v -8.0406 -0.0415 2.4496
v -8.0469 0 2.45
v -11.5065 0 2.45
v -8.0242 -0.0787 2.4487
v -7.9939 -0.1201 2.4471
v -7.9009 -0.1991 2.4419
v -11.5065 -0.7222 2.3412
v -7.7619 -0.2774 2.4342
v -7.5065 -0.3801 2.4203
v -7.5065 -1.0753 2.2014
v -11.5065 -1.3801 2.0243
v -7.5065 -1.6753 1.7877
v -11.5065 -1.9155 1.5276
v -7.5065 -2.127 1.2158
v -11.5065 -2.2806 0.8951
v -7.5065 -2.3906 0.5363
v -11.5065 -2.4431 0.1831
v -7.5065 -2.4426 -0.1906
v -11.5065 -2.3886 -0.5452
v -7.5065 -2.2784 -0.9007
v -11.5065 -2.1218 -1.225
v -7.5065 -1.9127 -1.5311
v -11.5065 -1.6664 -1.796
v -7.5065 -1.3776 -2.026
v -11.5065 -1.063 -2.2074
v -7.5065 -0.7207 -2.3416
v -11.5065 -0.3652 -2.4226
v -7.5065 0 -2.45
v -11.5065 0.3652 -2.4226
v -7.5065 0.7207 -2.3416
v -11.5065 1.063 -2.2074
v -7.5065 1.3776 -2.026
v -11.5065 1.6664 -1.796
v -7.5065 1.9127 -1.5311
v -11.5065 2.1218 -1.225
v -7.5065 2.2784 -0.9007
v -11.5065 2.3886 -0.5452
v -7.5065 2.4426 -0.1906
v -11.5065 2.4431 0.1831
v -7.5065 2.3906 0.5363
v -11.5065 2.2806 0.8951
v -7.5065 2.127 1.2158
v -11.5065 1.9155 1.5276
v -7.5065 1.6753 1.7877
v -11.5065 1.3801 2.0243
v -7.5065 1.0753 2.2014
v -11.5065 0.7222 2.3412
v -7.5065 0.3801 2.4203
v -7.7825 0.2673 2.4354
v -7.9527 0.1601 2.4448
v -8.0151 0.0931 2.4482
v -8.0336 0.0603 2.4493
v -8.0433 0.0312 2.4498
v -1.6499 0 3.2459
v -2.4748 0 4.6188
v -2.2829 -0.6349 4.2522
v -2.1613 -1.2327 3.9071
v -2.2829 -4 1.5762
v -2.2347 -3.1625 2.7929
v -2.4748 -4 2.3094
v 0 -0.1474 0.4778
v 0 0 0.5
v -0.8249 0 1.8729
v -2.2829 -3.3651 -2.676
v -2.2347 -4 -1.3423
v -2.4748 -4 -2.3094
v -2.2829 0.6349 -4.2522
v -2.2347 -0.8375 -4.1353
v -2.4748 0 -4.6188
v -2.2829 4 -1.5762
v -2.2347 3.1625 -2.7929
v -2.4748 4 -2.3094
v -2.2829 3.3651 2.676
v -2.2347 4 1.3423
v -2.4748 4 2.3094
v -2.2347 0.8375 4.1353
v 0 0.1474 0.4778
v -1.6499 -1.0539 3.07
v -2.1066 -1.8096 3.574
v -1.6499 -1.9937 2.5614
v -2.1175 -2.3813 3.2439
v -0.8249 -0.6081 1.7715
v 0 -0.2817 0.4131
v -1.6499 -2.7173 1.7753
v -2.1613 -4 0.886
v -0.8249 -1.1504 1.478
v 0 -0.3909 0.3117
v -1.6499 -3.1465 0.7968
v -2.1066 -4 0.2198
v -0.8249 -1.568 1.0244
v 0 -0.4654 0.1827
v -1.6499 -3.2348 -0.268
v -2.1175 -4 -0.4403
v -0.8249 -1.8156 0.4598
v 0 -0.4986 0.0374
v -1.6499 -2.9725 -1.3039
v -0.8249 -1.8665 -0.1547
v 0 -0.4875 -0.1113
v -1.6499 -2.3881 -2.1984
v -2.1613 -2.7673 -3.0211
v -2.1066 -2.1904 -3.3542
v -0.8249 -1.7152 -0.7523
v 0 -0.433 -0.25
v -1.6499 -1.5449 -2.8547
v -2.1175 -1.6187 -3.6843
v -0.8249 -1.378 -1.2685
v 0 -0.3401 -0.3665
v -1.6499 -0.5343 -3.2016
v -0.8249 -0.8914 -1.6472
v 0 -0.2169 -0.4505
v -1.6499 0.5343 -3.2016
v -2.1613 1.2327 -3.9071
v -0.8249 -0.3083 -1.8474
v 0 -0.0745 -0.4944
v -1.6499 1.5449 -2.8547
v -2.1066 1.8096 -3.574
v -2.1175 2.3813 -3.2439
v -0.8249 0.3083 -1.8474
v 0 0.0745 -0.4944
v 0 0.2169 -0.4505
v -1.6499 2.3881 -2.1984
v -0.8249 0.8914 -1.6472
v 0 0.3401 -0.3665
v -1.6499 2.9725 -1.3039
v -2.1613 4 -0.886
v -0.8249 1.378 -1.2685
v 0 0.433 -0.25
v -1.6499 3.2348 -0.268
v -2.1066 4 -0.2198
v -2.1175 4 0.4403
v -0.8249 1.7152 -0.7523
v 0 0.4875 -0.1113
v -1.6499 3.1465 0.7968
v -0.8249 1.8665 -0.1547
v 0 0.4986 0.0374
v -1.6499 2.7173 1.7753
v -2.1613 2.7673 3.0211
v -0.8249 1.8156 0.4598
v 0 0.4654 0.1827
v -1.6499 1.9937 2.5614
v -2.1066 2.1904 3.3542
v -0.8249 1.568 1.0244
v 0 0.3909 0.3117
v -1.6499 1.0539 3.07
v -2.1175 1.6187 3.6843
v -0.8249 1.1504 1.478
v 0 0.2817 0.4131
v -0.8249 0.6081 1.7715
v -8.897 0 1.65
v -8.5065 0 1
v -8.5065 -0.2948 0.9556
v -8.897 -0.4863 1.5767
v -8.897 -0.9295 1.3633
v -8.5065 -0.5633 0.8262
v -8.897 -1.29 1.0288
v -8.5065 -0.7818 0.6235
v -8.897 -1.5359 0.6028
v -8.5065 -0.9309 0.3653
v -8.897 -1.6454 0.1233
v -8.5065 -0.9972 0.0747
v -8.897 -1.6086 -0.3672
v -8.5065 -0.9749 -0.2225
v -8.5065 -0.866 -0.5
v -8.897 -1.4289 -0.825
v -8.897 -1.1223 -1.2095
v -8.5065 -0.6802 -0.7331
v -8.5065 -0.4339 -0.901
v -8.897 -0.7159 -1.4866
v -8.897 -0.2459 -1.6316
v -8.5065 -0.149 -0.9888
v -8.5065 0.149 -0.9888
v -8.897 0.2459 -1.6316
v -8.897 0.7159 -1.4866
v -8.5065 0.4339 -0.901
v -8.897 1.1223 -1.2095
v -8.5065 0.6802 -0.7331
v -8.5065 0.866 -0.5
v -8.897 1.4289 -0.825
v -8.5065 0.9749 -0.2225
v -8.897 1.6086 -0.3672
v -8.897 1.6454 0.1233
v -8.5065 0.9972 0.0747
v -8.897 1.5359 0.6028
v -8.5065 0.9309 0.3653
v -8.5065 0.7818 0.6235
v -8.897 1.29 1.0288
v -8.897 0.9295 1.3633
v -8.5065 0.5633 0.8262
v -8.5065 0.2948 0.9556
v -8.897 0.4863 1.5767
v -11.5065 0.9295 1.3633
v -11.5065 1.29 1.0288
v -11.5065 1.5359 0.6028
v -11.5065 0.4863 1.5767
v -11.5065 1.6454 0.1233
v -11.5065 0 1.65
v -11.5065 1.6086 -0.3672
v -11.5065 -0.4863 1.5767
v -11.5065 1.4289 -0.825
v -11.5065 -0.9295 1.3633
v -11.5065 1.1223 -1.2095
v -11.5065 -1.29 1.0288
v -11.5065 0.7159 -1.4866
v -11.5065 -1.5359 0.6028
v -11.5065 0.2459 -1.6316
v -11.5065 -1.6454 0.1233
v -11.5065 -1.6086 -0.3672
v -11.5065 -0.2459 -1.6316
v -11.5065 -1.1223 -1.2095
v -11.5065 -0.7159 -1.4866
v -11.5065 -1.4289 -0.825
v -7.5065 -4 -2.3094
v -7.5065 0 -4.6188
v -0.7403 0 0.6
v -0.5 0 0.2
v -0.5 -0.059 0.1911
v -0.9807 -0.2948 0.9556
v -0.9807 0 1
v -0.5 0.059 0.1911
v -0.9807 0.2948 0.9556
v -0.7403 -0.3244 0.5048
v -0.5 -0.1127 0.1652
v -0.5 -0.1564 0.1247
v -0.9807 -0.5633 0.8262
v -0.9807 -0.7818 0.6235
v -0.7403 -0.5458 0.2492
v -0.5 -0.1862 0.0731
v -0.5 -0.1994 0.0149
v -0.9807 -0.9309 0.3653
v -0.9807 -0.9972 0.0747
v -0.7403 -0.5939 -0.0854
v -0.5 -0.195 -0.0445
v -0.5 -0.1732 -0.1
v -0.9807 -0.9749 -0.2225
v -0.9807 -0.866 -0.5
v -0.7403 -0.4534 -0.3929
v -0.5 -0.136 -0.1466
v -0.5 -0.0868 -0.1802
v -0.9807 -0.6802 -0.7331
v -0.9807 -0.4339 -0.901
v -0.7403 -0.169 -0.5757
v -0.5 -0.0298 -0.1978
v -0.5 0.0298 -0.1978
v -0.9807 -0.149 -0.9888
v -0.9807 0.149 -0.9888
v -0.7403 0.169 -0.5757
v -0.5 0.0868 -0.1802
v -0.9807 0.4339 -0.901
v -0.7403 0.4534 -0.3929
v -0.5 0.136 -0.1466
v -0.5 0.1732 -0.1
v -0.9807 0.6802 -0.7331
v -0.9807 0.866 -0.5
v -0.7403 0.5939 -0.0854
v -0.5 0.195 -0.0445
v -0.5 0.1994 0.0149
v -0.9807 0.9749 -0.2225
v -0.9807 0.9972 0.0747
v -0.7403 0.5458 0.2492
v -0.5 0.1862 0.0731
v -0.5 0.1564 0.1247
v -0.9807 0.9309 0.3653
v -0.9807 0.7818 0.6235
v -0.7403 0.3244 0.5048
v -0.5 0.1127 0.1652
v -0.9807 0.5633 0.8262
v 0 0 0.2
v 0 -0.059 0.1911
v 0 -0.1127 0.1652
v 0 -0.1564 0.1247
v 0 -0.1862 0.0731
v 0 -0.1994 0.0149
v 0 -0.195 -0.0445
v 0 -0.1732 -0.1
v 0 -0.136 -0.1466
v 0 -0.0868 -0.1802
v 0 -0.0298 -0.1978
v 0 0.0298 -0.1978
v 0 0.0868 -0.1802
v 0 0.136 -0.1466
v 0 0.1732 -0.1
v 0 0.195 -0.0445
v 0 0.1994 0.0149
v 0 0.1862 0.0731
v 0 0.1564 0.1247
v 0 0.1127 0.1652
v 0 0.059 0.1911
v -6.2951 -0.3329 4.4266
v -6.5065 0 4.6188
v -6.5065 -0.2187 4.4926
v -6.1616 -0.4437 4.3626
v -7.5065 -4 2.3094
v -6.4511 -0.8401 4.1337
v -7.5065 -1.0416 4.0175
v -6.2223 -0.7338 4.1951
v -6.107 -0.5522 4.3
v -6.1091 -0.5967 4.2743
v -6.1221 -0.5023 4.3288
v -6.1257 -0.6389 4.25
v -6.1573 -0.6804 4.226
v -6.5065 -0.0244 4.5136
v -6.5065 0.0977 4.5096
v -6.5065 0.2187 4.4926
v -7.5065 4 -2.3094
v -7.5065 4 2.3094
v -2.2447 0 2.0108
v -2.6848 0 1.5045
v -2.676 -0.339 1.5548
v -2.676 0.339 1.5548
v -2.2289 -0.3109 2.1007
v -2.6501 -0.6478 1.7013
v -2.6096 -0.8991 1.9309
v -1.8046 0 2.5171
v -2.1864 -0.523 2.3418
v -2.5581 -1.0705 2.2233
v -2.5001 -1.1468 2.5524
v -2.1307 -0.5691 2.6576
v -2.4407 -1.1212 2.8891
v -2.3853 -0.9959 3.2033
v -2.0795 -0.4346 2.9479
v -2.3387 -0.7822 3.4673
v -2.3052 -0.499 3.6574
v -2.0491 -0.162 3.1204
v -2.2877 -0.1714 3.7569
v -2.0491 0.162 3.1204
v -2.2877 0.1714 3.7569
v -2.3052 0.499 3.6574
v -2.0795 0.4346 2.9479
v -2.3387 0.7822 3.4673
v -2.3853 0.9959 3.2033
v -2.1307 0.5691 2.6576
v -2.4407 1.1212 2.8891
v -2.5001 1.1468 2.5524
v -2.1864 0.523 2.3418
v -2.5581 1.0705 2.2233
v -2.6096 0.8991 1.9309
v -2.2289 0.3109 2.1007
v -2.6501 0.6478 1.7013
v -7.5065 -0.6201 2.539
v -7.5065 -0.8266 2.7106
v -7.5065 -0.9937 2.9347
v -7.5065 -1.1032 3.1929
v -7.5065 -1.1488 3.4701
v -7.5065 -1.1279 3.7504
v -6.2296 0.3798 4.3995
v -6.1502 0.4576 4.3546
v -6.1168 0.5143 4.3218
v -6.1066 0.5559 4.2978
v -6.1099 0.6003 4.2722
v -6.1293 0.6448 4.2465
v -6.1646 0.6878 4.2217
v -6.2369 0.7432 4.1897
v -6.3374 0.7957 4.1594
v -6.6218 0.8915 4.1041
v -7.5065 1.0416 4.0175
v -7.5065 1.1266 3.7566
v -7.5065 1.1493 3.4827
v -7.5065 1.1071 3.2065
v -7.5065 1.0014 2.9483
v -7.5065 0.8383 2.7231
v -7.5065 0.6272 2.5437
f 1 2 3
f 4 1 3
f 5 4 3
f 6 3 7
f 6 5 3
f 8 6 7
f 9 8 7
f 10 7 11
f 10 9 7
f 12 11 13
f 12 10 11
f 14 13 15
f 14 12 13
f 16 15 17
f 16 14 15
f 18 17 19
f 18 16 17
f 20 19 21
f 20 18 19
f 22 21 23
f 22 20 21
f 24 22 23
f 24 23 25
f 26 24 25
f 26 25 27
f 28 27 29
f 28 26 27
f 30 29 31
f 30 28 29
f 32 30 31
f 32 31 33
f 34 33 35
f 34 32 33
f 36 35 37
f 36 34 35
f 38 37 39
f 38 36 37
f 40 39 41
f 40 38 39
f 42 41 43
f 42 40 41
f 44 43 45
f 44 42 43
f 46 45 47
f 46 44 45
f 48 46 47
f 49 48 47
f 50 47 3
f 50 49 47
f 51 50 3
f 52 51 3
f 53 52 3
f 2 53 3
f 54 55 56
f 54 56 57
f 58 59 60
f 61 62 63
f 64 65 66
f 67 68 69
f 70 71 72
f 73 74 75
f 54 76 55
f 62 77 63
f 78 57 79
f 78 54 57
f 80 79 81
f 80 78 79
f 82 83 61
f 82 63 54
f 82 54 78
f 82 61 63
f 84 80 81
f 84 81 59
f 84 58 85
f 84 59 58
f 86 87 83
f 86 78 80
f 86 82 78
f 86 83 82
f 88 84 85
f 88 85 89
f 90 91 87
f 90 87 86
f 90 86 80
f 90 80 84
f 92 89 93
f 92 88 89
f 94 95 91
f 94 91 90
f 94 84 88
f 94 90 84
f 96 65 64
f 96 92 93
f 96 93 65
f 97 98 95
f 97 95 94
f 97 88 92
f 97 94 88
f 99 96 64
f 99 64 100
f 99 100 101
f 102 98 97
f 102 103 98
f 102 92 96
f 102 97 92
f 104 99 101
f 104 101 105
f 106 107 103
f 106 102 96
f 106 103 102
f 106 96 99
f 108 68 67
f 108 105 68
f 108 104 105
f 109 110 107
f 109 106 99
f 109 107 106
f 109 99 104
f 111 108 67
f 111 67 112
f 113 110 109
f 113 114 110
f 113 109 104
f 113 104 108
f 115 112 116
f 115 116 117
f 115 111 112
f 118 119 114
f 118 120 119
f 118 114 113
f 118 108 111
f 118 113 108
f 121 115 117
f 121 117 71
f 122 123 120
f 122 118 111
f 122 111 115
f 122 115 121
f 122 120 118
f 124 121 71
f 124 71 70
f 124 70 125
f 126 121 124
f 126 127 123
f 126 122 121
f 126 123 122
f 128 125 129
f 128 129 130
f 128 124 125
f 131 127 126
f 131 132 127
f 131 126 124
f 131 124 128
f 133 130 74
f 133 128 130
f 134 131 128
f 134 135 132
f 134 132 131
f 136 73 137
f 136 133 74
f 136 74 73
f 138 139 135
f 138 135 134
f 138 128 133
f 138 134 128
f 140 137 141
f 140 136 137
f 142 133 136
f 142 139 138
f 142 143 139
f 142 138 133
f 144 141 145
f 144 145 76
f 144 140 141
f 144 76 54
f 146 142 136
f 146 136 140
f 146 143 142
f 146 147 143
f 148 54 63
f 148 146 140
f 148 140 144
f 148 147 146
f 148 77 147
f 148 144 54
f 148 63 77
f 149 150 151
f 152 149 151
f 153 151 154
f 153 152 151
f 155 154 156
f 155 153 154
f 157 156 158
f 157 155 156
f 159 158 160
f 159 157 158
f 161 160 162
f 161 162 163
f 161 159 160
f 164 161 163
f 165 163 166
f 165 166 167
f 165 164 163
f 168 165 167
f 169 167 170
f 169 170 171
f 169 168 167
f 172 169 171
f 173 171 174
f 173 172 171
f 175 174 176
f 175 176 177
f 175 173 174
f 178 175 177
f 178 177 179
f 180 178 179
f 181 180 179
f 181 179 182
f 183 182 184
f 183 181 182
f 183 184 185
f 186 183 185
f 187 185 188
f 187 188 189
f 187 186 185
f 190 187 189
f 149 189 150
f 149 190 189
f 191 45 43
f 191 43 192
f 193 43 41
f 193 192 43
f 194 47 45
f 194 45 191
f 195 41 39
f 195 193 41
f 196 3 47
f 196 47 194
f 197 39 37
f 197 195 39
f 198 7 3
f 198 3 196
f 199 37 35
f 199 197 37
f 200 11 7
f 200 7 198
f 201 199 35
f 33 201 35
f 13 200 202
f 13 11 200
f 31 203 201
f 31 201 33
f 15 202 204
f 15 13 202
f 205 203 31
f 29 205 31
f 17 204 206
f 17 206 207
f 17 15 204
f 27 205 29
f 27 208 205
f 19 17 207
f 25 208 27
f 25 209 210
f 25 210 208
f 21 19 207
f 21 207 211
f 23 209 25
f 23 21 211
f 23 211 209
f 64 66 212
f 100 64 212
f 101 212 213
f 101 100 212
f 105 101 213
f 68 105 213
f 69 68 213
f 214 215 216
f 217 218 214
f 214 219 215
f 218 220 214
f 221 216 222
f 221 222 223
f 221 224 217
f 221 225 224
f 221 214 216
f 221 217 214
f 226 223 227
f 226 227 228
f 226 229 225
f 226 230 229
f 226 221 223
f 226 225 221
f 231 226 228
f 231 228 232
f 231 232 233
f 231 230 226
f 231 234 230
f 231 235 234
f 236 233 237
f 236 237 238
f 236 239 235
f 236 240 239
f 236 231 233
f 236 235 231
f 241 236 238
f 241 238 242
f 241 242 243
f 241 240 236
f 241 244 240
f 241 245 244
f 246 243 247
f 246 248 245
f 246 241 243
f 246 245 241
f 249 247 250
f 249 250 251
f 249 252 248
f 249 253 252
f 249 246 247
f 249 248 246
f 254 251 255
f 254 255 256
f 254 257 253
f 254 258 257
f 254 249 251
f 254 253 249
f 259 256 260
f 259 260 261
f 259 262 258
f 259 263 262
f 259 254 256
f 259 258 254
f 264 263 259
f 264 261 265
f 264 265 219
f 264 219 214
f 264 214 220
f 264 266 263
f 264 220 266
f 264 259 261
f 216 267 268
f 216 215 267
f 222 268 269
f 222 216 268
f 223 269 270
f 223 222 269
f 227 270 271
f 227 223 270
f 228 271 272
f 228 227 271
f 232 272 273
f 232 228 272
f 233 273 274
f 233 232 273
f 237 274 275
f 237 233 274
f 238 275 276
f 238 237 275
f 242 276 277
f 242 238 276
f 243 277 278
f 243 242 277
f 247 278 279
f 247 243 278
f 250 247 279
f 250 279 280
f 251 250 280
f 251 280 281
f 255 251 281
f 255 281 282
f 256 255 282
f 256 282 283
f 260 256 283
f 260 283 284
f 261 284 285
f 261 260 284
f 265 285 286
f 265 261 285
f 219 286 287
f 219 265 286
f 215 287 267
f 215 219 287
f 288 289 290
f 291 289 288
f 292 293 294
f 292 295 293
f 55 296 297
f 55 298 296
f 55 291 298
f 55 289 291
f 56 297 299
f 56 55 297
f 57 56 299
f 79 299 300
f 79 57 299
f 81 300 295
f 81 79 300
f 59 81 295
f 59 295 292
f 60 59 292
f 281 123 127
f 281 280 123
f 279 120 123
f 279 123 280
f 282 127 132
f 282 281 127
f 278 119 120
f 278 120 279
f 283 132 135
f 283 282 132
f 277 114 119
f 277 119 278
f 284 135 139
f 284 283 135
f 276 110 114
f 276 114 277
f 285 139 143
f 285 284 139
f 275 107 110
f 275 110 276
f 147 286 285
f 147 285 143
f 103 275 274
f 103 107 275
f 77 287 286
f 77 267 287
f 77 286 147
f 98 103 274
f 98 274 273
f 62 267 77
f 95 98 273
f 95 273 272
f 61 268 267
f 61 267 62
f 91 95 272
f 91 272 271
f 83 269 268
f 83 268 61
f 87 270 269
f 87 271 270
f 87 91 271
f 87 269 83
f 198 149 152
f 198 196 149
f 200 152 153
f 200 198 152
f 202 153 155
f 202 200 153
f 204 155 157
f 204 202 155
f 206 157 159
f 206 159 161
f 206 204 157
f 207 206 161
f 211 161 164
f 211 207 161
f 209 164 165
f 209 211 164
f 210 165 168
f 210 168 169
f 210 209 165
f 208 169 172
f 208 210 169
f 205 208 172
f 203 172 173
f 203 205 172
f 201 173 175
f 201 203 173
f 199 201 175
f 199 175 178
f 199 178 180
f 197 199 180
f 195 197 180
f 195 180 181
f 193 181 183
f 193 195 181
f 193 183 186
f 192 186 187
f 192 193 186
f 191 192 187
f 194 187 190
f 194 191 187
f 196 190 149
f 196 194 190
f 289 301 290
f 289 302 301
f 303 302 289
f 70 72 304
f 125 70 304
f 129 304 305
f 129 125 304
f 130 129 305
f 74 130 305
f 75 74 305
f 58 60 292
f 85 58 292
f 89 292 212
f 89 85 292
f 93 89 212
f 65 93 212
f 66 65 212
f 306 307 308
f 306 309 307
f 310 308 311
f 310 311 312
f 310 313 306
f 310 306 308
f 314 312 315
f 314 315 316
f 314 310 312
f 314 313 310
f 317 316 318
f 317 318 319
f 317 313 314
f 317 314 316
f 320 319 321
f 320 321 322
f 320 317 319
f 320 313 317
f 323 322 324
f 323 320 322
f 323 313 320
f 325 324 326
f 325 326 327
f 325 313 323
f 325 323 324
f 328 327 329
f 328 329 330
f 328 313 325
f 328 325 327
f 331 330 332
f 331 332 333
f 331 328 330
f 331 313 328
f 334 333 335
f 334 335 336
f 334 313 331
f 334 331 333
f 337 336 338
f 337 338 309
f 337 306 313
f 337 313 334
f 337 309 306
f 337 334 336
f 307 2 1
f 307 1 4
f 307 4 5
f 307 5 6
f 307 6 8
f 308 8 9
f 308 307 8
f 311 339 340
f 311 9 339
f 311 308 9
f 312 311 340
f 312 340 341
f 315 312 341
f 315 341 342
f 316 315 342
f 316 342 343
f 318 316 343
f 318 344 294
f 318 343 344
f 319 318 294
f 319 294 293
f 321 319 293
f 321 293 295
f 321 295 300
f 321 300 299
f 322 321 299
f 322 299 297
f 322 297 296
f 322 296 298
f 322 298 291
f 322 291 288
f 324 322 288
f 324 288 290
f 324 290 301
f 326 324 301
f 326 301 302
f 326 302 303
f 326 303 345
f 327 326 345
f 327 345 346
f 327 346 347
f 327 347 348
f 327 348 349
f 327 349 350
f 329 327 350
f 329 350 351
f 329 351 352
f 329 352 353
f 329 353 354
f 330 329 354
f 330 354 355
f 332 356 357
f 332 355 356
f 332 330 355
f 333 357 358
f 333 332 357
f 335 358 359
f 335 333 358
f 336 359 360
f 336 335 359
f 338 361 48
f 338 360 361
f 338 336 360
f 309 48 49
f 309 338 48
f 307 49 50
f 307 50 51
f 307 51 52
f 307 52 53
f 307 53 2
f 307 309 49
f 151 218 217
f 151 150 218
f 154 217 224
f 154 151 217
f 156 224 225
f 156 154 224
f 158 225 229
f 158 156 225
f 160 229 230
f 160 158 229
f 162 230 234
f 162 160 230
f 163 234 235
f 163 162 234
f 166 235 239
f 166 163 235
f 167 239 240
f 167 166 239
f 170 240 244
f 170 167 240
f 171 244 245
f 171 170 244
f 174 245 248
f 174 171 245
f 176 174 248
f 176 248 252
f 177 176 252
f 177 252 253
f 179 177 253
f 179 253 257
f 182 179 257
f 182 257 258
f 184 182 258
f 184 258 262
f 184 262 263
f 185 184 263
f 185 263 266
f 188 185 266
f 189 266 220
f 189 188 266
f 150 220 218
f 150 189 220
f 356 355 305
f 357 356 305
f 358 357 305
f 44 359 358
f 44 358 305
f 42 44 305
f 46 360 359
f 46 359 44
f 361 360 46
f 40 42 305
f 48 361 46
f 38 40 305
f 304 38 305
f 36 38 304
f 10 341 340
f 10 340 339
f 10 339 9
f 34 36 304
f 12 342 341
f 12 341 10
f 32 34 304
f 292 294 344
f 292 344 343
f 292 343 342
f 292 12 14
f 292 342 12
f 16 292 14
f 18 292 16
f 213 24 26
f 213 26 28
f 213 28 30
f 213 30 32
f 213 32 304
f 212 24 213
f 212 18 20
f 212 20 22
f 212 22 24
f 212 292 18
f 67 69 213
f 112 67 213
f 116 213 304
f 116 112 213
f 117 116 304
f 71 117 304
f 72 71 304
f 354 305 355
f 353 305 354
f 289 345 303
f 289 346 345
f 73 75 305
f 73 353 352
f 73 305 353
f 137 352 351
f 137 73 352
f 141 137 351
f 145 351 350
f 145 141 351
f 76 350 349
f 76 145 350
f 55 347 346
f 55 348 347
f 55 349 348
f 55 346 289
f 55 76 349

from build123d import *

# Parameters (mm, degrees)
SKETCH2_OUTSIDE_W  = 23.078
SKETCH2_OUTSIDE_H  = 23.078
CUT_EXTRUDE1_DEPTH = 17.136867678
SKETCH4_W          = 1
SKETCH4_H          = 1
CUT_EXTRUDE2_DEPTH = 1


with BuildPart() as part:
    # Sketch1 → Revolve1 (revolve)
    with BuildSketch(Plane.XY, mode=Mode.PRIVATE) as revolve1_sk:
        Polygon((-7.506454643, 8), (-4.506454643, 8), (0, 0.5), (0, 0.2), (-0.5, 0.2), (-0.980688495, 1), (-8.506454643, 1), (-8.897014045, 1.65), (-11.506454643, 1.65), (-11.506454643, 2.45), (-7.506454643, 2.45), align=None)
    revolve(revolve1_sk.sketch.rotate(Axis((-1000, 0, 0), (1, 0, 0)), 90), axis=Axis((-1000, 0, 0), (1, 0, 0)))

    # Sketch2 outside → Cut-Extrude1 (cut, through all)
    with BuildSketch(Plane(origin=(0, 0, 0), x_dir=(0, 0, -1), z_dir=(1, 0, 0))):
        Rectangle(SKETCH2_OUTSIDE_W, SKETCH2_OUTSIDE_H)
        Polygon((4.618802154, 0), (2.309401077, 4), (-2.309401077, 4), (-4.618802154, 0), (-2.309401077, -4), (2.309401077, -4), align=None, mode=Mode.SUBTRACT)
    extrude(amount=-CUT_EXTRUDE1_DEPTH, mode=Mode.SUBTRACT)

    # Sketch3 → Cut-Revolve1 (revolve, cut)
    with BuildSketch(Plane(origin=(0, 0, 0), x_dir=(1, 0, 0), z_dir=(0, 1, 0)), mode=Mode.PRIVATE) as cut_revolve1_sk:
        Polygon((-10.36359318, -4.026237068), (-10.163897775, -5.158765984), (-2.285435751, -3.769580562), (-1.80463913, -2.517062542), align=None)
    revolve(cut_revolve1_sk.sketch.rotate(Axis((-1.80463913, 0, 2.517062542), (-0.9848077530122068, 0, 0.17364817766693816)), 180), axis=Axis((-1.80463913, 0, 2.517062542), (-0.9848077530122068, 0, 0.17364817766693816)), mode=Mode.SUBTRACT)

    # Sketch4 → Cut-Extrude2 (cut)
    with BuildSketch(Plane.ZY.offset(7.506454643)):
        with Locations((4.118802154, 0)):
            Rectangle(SKETCH4_W, SKETCH4_H)
    extrude(amount=-CUT_EXTRUDE2_DEPTH, mode=Mode.SUBTRACT)


solid = part.part
